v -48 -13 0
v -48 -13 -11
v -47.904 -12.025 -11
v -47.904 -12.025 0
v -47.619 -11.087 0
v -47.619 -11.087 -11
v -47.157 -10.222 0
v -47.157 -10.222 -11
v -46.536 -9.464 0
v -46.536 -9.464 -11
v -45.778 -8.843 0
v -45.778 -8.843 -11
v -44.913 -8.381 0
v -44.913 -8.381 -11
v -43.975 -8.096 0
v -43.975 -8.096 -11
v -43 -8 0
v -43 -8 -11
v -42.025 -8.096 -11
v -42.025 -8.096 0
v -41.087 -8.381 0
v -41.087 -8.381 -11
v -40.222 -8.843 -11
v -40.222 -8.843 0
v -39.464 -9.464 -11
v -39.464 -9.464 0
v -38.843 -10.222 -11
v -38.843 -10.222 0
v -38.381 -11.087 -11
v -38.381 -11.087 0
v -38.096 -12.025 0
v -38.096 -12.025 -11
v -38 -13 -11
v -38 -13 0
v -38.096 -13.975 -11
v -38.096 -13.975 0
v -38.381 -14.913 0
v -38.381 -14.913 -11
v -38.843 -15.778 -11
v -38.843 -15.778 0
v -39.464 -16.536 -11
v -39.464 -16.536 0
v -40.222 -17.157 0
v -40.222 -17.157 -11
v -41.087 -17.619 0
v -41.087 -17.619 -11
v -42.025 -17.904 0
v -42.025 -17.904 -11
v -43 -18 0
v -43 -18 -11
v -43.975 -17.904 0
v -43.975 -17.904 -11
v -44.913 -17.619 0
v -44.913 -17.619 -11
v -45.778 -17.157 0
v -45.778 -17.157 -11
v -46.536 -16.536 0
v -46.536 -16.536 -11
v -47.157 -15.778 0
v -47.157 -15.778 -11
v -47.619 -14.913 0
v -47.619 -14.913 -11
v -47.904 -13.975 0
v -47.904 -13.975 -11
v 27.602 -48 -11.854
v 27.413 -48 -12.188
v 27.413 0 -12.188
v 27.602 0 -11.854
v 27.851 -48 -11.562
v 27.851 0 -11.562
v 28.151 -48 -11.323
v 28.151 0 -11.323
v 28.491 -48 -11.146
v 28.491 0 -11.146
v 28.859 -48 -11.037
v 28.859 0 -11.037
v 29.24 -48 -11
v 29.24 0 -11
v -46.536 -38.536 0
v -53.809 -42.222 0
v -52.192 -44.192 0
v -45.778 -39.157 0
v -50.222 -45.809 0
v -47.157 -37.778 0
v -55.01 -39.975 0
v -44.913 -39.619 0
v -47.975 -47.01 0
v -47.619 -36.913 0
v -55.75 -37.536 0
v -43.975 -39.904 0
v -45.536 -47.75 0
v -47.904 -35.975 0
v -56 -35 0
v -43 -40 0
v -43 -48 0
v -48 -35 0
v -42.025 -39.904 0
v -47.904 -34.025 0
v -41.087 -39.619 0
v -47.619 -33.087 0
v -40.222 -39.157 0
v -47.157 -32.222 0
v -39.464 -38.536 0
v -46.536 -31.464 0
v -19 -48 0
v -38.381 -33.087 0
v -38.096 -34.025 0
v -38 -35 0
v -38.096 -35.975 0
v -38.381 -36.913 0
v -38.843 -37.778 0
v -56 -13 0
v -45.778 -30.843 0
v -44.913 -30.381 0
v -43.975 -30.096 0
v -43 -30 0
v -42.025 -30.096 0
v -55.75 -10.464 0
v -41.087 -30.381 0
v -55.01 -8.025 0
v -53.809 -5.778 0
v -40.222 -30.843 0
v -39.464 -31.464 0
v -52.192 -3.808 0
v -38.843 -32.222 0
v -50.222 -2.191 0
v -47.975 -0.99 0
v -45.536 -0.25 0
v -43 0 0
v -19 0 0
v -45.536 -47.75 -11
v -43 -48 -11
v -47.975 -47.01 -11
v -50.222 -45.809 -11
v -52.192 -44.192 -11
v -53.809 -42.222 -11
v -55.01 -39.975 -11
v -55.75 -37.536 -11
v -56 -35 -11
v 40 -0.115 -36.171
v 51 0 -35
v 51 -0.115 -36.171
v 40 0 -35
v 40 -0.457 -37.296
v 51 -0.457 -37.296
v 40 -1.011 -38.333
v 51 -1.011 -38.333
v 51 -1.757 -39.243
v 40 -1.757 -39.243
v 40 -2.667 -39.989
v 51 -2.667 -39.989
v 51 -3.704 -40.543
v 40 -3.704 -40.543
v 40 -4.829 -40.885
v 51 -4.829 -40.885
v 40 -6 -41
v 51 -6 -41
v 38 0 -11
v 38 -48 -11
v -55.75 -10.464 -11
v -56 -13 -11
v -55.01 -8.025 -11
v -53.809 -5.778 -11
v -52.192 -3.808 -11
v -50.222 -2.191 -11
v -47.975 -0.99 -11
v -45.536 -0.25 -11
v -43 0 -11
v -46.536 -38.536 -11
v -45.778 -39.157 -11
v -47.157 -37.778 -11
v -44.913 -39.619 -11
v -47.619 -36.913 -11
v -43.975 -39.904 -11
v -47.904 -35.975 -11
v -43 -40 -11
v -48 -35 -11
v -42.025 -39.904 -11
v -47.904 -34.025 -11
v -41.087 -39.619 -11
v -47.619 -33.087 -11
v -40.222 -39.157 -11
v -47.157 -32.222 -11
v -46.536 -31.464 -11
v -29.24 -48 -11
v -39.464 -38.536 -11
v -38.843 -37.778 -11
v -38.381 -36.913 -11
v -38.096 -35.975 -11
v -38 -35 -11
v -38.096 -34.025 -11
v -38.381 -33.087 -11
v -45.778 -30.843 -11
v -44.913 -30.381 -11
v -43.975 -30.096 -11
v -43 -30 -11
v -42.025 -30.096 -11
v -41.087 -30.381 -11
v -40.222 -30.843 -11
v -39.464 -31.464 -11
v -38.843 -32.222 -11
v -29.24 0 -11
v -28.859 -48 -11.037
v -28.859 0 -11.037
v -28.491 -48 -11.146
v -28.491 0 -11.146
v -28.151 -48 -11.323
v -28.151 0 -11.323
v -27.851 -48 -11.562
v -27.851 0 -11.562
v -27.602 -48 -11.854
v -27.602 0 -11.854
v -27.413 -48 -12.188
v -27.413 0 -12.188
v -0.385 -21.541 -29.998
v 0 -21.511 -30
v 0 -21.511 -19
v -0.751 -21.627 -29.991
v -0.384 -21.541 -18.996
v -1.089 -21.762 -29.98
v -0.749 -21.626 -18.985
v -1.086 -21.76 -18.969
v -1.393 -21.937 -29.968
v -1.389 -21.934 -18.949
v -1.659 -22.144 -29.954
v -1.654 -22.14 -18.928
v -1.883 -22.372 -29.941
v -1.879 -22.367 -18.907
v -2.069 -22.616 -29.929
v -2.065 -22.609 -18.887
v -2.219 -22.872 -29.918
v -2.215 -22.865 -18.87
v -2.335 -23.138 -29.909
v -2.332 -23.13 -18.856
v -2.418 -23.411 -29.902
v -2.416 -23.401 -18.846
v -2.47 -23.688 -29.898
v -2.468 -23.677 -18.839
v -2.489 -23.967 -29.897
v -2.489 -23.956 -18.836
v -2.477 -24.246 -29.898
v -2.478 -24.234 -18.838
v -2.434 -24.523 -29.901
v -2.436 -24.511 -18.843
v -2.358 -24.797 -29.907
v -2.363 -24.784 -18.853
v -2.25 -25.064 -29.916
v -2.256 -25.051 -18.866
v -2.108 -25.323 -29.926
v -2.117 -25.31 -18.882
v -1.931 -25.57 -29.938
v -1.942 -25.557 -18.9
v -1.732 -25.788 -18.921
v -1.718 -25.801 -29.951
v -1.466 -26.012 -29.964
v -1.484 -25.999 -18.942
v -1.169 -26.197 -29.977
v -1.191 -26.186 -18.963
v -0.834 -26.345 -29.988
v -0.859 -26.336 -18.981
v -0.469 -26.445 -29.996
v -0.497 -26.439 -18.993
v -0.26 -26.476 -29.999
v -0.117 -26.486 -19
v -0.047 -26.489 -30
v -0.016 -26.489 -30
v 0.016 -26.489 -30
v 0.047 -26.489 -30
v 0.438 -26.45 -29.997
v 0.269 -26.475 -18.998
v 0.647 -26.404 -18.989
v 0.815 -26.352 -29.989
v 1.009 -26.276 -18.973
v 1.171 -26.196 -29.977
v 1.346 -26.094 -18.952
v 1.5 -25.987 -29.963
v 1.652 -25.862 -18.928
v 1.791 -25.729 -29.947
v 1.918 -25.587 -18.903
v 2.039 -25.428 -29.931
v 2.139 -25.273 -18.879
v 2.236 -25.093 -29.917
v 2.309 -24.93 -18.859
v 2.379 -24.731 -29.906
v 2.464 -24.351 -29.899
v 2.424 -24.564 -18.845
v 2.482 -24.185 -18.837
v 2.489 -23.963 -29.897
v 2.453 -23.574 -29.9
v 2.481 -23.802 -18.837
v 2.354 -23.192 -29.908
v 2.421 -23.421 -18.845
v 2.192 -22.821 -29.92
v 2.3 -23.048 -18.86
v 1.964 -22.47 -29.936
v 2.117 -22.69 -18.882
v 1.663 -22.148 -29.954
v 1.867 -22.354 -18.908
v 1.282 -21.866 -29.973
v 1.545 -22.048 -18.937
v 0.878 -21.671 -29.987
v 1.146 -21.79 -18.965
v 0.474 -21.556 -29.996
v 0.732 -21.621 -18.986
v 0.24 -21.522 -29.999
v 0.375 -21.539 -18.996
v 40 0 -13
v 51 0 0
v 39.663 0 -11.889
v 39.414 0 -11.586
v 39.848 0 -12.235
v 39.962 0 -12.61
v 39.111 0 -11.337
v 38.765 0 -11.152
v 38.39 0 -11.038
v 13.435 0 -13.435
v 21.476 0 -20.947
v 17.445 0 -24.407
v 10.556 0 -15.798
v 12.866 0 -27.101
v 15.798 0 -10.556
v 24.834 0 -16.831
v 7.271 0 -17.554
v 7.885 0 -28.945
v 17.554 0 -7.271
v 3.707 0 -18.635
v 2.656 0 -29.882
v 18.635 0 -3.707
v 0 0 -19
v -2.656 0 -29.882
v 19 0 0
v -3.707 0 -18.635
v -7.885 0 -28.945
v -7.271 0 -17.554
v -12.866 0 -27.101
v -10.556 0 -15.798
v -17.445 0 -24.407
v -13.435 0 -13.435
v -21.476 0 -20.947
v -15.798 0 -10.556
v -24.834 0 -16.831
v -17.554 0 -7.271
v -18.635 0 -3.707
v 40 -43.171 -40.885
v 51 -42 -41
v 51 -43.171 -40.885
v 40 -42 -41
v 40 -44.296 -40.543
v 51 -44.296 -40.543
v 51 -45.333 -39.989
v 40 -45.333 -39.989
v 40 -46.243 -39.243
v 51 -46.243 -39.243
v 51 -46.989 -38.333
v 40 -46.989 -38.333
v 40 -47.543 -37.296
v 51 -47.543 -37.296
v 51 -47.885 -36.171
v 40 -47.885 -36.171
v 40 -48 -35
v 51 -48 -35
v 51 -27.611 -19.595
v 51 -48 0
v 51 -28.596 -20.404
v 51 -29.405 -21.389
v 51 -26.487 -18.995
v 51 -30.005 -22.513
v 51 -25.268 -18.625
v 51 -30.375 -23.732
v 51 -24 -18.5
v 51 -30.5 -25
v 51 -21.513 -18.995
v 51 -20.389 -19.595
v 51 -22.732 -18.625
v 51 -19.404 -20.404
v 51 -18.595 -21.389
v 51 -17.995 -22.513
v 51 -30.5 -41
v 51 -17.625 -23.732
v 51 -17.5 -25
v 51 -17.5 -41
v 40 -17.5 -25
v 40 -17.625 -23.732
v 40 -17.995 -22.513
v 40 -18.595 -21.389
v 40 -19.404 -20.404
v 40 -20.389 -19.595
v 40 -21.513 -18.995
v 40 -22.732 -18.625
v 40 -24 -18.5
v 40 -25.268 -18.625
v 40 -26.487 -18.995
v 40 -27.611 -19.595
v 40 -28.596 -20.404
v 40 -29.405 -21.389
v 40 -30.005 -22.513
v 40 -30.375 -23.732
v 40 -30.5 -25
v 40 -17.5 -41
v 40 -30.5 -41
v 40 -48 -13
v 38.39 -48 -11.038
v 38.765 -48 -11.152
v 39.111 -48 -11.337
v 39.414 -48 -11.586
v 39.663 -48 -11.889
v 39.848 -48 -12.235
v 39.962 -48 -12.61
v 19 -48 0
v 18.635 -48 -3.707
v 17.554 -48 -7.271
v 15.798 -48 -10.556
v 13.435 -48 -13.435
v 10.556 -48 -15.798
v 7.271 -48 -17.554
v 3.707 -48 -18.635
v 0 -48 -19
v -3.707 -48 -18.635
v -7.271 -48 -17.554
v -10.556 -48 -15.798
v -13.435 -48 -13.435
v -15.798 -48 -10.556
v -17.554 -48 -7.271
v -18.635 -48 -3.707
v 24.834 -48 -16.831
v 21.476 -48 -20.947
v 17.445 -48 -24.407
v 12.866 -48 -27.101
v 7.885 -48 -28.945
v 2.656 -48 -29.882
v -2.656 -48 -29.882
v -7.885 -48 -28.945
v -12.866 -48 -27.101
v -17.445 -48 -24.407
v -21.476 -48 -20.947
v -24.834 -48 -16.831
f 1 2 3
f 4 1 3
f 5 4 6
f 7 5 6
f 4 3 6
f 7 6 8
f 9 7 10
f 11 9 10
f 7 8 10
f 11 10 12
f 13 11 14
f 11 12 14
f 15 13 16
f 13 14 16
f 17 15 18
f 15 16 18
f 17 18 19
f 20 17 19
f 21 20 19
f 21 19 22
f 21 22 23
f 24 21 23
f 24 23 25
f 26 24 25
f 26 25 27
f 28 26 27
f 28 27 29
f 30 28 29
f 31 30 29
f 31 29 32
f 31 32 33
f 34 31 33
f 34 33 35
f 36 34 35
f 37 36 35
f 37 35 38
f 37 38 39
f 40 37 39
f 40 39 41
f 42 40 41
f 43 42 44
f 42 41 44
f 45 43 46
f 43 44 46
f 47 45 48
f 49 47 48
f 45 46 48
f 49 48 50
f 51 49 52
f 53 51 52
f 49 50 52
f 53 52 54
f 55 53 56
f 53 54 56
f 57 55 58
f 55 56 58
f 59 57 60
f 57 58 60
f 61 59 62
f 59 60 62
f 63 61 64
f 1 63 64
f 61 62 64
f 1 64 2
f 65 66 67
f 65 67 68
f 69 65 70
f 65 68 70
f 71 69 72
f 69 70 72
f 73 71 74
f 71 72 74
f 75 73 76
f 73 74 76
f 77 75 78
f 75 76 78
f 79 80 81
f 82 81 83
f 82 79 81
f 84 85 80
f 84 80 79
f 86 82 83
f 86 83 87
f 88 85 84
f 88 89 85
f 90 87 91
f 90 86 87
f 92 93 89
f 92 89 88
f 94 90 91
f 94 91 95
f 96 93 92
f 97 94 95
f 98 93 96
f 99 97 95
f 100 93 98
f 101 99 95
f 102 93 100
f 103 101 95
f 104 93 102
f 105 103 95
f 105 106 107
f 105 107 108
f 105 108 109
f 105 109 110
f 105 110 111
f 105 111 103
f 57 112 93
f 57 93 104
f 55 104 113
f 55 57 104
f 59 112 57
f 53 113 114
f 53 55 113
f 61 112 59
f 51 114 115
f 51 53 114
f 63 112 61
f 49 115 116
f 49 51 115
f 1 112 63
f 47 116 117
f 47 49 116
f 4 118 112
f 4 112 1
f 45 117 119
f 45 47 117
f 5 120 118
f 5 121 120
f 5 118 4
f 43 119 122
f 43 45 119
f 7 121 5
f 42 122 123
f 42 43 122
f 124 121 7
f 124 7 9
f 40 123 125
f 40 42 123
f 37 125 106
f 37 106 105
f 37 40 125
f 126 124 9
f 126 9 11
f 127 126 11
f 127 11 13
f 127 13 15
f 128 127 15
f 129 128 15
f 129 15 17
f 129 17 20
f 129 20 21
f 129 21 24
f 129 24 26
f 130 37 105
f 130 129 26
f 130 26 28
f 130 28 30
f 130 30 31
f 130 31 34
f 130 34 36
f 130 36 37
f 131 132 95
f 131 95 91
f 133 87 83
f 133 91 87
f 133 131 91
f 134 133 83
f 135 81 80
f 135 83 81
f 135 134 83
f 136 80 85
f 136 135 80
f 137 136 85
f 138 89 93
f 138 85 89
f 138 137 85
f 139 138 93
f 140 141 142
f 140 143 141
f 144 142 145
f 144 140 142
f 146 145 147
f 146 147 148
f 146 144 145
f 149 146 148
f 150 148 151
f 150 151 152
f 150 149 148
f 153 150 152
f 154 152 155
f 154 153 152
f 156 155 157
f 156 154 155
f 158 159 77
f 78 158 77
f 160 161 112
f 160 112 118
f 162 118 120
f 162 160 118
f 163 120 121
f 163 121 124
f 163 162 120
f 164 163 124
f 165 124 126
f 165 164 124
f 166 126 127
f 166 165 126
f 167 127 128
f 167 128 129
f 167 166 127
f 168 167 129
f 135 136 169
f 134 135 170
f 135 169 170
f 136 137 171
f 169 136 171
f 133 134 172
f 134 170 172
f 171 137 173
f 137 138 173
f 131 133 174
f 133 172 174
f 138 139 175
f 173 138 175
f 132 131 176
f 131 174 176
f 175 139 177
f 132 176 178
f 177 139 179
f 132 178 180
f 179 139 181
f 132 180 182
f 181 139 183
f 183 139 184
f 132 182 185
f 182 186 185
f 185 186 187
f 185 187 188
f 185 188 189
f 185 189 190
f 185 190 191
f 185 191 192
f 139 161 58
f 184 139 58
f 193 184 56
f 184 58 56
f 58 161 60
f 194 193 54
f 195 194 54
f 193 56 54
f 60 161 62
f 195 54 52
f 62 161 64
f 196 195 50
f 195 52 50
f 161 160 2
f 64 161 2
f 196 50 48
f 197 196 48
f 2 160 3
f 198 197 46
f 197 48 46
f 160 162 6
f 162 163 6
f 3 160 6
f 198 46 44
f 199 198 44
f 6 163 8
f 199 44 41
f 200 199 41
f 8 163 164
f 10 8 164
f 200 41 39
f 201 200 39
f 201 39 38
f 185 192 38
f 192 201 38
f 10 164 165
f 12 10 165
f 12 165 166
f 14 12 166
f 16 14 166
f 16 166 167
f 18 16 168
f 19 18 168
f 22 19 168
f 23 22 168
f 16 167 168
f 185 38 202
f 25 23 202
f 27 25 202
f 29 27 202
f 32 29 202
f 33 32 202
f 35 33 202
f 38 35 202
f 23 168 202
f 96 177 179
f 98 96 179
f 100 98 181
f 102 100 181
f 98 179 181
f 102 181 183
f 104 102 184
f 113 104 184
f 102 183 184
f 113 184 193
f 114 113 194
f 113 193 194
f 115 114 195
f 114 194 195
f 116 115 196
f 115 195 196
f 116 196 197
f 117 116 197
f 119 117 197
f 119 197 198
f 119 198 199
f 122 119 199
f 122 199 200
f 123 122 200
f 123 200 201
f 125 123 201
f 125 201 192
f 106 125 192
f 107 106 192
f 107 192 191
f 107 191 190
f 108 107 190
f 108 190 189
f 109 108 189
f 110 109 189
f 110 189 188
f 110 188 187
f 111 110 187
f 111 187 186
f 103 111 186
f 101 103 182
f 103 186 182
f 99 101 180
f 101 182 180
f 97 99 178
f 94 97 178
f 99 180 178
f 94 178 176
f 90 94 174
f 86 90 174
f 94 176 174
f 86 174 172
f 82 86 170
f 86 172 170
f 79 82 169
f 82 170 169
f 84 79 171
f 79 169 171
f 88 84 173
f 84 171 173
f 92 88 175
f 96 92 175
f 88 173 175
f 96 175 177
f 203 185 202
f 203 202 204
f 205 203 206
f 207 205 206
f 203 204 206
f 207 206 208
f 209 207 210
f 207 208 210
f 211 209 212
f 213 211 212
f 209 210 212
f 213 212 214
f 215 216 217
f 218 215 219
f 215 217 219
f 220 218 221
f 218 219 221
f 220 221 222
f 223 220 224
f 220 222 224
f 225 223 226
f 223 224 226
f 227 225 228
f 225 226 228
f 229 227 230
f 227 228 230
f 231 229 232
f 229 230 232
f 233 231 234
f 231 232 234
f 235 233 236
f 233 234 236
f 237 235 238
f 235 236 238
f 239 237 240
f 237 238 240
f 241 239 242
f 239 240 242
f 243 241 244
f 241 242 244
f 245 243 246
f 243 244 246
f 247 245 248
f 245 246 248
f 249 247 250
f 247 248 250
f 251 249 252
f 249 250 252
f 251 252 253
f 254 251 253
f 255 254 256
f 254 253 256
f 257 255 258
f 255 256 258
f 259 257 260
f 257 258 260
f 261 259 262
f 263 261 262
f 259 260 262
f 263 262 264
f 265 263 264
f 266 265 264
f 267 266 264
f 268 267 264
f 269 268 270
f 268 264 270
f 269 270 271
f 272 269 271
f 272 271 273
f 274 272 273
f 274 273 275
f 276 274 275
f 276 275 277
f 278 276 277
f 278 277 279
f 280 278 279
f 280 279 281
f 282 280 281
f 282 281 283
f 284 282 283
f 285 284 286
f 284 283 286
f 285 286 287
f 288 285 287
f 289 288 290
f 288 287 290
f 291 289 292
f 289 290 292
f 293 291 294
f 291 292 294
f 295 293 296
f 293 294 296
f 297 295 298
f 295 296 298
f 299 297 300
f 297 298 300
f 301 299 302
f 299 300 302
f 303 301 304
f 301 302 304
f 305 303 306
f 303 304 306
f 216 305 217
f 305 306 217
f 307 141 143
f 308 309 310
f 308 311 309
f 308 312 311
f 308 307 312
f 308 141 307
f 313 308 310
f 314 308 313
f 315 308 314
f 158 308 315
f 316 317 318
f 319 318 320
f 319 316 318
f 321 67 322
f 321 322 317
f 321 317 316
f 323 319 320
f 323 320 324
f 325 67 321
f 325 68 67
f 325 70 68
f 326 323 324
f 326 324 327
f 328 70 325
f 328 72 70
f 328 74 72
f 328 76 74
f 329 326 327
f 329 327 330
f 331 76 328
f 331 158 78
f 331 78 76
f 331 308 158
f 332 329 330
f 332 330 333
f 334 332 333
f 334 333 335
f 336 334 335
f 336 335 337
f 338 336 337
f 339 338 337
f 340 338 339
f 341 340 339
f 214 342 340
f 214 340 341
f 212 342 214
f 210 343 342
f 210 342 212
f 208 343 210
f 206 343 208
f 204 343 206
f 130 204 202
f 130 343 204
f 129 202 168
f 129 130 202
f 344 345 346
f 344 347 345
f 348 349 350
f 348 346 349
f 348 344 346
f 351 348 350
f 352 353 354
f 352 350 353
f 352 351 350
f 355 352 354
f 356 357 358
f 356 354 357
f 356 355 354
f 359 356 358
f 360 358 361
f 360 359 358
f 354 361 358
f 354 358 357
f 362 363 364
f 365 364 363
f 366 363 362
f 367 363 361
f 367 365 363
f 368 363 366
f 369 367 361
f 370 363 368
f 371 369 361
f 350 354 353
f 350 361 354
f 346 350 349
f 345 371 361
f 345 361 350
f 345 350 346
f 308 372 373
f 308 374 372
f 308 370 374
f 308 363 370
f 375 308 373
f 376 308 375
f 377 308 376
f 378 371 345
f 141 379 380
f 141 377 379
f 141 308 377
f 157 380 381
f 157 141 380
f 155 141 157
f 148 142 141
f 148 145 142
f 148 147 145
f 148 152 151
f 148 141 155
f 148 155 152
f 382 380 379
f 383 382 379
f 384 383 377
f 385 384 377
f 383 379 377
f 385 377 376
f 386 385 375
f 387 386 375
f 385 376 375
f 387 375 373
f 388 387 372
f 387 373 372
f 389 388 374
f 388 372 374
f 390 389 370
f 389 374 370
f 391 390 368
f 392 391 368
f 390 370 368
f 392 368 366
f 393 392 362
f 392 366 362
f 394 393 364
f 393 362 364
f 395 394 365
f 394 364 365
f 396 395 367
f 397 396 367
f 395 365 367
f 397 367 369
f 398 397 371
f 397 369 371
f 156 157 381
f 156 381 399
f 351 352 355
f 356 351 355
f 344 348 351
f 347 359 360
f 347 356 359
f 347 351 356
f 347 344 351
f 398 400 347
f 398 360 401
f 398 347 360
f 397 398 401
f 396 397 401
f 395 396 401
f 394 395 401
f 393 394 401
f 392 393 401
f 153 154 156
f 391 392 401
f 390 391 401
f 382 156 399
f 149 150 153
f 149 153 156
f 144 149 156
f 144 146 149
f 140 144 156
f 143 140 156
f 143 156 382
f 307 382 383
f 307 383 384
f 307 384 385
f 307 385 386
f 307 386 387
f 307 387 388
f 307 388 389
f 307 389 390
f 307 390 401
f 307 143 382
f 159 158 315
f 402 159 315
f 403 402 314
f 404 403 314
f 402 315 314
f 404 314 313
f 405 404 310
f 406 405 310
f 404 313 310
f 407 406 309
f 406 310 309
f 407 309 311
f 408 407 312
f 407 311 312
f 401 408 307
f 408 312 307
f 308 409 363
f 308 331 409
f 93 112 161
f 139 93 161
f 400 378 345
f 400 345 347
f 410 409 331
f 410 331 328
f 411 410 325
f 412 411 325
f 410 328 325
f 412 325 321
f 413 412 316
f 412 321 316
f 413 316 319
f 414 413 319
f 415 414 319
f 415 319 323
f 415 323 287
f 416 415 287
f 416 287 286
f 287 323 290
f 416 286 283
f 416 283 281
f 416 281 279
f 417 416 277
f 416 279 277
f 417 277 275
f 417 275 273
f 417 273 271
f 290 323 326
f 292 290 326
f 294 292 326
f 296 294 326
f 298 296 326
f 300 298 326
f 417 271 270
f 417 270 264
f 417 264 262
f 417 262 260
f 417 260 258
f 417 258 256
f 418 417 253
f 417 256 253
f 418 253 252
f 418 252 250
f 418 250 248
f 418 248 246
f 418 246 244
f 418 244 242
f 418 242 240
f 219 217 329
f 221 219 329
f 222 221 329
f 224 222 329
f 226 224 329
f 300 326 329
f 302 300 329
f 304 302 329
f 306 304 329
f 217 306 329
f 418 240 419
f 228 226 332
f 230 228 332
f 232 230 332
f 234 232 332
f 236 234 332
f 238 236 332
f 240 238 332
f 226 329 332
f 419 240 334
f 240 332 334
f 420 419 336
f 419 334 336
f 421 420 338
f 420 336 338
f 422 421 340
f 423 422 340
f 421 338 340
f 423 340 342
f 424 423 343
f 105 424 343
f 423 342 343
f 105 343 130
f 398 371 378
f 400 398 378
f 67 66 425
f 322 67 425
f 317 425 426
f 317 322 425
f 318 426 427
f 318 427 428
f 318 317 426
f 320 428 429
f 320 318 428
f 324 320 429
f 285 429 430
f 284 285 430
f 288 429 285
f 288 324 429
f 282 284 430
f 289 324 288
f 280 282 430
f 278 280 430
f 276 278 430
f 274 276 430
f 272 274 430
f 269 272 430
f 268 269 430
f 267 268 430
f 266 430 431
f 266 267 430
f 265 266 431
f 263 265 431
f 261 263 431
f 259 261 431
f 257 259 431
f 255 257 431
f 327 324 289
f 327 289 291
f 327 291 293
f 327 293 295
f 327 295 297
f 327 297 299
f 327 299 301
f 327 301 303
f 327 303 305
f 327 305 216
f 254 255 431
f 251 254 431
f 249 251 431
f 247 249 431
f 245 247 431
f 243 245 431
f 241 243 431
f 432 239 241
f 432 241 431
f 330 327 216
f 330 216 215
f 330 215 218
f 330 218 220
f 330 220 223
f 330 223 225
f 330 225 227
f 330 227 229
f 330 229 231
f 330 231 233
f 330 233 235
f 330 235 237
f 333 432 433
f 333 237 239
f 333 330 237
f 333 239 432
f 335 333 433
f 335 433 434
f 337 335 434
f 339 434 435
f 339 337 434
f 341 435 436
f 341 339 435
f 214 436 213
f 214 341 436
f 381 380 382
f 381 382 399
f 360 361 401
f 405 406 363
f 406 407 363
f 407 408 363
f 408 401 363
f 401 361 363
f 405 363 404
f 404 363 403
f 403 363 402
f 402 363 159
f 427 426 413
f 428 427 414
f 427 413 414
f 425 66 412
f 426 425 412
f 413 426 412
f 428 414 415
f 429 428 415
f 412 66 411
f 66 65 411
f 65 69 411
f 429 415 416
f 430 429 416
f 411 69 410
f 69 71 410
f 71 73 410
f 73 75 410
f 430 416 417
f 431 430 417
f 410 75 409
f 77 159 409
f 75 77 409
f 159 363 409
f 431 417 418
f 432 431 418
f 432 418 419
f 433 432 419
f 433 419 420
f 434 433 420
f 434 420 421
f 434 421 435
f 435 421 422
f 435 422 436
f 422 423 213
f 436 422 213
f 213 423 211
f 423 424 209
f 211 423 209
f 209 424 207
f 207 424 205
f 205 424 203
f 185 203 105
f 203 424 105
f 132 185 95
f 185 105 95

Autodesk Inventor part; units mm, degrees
ref_plane "YZ Plane" through (0, 0, 0) normal (1, 0, 0) x (0, 1, 0)
ref_plane "XZ Plane" through (0, 0, 0) normal (0, 1, 0) x (-1, 0, 0)
sketch "Náčrt1" plane through (0, 0, 0) normal (0, 1, 0) x (-1, 0, 0)
  arc A0 (-19, 0) -> (19, 0) centre (0, 0) ccw
  arc A1 (-27.4129, -12.1875) -> (27.4129, -12.1875) centre (0, 0) ccw
  line L0 (56, 0) -> (56, -11)
  line L1 (56, -11) -> (29.2404, -11)
  line L2 (-51, 0) -> (-51, -41)
  line L3 (-51, -41) -> (-40, -41)
  line L4 (-40, -41) -> (-40, -13)
  line L5 (-38, -11) -> (-29.2404, -11)
  arc A2 (29.2404, -11) -> (27.4129, -12.1875) centre (29.2404, -13) ccw
  arc A3 (-27.4129, -12.1875) -> (-29.2404, -11) centre (-29.2404, -13) ccw
  arc A4 (-38, -11) -> (-40, -13) centre (-38, -13) ccw
  line L6 (56, 0) -> (19, 0)
  line L7 (-19, 0) -> (-51, 0)
  point P0 (27.9106, -11)
  point P1 (-27.9106, -11)
  dimension "d0" = 19
  dimension "d1" = 30
  dimension "d3" = 107
  dimension "d4" = 51
  dimension "d5" = 11
  dimension "d6" = 41
  dimension "d7" = 11
  dimension "d8" = 2
  dimension "d9" = 2
  dimension "d10" = 2
  dimension "d16" = 96
  dimension "d17" = 56
extrude "Vysunutí1" add sketch "Náčrt1" against normal blind 48
fillet "Zaoblení1" radius 13 1 edges at (-56, 0, -5.5)
fillet "Zaoblení2" radius 13 1 edges at (-56, -48, -5.5)
fillet "Zaoblení3" radius 6 2 edges at (45.5, -48, -41) (45.5, 0, -41)
sketch "Náčrt2" plane through (-29.2404, -48, -11) normal (0, 0, -1) x (-1, 0, 0)
  line L0 (-56.6532, 0) -> (-1.8275, 0) projected
  circle A0 centre (13.7596, 13) radius 5
  circle A1 centre (13.7596, 35) radius 5
  point P0 (-29.2404, 48)
  dimension "d26" = 10
  dimension "d27" = 10
  dimension "d28" = 35
  dimension "d29" = 13
  dimension "d30" = 38.3139
  dimension "d31" = 20.2968
extrude "Vysunutí2" cut sketch "Náčrt2" against normal blind 11
ref_plane "Pracovní rovina1" through (0, 0, -30) normal (0, 0, -1) x (-1, 0, 0)
sketch "Náčrt3" plane through (0, 0, -30) normal (0, 0, -1) x (-1, 0, 0)
  circle A0 centre (0, -24) radius 2.5
  point P0 (0, 0)
  dimension "d34" = 5
hole "Díra1" at (0, -24, -30) direction (0, 0, 1) diameter 4.9784 end through all thread size "1/4-20 UNC" class "2B" standard "ANSI Unified Screw Threads"
sketch "Náčrt4" plane through (51, -48, 0) normal (1, 0, 0) x (0, 0, -1)
  line L0 (0, 48) -> (0, 0) projected
  line L1 (0, 48) -> (35, 48) projected
  arc A0 (25, 30.5) -> (25, 17.5) centre (25, 24) ccw
  line L2 (25, 30.5) -> (41, 30.5)
  line L3 (25, 17.5) -> (41, 17.5)
  line L4 (41, 17.5) -> (41, 30.5)
  dimension "d45" = 13
  dimension "d46" = 24
  dimension "d47" = 25
  dimension "d48" = 41
extrude "Vysunutí3" cut sketch "Náčrt4" against normal blind 11
properties part number "3"
